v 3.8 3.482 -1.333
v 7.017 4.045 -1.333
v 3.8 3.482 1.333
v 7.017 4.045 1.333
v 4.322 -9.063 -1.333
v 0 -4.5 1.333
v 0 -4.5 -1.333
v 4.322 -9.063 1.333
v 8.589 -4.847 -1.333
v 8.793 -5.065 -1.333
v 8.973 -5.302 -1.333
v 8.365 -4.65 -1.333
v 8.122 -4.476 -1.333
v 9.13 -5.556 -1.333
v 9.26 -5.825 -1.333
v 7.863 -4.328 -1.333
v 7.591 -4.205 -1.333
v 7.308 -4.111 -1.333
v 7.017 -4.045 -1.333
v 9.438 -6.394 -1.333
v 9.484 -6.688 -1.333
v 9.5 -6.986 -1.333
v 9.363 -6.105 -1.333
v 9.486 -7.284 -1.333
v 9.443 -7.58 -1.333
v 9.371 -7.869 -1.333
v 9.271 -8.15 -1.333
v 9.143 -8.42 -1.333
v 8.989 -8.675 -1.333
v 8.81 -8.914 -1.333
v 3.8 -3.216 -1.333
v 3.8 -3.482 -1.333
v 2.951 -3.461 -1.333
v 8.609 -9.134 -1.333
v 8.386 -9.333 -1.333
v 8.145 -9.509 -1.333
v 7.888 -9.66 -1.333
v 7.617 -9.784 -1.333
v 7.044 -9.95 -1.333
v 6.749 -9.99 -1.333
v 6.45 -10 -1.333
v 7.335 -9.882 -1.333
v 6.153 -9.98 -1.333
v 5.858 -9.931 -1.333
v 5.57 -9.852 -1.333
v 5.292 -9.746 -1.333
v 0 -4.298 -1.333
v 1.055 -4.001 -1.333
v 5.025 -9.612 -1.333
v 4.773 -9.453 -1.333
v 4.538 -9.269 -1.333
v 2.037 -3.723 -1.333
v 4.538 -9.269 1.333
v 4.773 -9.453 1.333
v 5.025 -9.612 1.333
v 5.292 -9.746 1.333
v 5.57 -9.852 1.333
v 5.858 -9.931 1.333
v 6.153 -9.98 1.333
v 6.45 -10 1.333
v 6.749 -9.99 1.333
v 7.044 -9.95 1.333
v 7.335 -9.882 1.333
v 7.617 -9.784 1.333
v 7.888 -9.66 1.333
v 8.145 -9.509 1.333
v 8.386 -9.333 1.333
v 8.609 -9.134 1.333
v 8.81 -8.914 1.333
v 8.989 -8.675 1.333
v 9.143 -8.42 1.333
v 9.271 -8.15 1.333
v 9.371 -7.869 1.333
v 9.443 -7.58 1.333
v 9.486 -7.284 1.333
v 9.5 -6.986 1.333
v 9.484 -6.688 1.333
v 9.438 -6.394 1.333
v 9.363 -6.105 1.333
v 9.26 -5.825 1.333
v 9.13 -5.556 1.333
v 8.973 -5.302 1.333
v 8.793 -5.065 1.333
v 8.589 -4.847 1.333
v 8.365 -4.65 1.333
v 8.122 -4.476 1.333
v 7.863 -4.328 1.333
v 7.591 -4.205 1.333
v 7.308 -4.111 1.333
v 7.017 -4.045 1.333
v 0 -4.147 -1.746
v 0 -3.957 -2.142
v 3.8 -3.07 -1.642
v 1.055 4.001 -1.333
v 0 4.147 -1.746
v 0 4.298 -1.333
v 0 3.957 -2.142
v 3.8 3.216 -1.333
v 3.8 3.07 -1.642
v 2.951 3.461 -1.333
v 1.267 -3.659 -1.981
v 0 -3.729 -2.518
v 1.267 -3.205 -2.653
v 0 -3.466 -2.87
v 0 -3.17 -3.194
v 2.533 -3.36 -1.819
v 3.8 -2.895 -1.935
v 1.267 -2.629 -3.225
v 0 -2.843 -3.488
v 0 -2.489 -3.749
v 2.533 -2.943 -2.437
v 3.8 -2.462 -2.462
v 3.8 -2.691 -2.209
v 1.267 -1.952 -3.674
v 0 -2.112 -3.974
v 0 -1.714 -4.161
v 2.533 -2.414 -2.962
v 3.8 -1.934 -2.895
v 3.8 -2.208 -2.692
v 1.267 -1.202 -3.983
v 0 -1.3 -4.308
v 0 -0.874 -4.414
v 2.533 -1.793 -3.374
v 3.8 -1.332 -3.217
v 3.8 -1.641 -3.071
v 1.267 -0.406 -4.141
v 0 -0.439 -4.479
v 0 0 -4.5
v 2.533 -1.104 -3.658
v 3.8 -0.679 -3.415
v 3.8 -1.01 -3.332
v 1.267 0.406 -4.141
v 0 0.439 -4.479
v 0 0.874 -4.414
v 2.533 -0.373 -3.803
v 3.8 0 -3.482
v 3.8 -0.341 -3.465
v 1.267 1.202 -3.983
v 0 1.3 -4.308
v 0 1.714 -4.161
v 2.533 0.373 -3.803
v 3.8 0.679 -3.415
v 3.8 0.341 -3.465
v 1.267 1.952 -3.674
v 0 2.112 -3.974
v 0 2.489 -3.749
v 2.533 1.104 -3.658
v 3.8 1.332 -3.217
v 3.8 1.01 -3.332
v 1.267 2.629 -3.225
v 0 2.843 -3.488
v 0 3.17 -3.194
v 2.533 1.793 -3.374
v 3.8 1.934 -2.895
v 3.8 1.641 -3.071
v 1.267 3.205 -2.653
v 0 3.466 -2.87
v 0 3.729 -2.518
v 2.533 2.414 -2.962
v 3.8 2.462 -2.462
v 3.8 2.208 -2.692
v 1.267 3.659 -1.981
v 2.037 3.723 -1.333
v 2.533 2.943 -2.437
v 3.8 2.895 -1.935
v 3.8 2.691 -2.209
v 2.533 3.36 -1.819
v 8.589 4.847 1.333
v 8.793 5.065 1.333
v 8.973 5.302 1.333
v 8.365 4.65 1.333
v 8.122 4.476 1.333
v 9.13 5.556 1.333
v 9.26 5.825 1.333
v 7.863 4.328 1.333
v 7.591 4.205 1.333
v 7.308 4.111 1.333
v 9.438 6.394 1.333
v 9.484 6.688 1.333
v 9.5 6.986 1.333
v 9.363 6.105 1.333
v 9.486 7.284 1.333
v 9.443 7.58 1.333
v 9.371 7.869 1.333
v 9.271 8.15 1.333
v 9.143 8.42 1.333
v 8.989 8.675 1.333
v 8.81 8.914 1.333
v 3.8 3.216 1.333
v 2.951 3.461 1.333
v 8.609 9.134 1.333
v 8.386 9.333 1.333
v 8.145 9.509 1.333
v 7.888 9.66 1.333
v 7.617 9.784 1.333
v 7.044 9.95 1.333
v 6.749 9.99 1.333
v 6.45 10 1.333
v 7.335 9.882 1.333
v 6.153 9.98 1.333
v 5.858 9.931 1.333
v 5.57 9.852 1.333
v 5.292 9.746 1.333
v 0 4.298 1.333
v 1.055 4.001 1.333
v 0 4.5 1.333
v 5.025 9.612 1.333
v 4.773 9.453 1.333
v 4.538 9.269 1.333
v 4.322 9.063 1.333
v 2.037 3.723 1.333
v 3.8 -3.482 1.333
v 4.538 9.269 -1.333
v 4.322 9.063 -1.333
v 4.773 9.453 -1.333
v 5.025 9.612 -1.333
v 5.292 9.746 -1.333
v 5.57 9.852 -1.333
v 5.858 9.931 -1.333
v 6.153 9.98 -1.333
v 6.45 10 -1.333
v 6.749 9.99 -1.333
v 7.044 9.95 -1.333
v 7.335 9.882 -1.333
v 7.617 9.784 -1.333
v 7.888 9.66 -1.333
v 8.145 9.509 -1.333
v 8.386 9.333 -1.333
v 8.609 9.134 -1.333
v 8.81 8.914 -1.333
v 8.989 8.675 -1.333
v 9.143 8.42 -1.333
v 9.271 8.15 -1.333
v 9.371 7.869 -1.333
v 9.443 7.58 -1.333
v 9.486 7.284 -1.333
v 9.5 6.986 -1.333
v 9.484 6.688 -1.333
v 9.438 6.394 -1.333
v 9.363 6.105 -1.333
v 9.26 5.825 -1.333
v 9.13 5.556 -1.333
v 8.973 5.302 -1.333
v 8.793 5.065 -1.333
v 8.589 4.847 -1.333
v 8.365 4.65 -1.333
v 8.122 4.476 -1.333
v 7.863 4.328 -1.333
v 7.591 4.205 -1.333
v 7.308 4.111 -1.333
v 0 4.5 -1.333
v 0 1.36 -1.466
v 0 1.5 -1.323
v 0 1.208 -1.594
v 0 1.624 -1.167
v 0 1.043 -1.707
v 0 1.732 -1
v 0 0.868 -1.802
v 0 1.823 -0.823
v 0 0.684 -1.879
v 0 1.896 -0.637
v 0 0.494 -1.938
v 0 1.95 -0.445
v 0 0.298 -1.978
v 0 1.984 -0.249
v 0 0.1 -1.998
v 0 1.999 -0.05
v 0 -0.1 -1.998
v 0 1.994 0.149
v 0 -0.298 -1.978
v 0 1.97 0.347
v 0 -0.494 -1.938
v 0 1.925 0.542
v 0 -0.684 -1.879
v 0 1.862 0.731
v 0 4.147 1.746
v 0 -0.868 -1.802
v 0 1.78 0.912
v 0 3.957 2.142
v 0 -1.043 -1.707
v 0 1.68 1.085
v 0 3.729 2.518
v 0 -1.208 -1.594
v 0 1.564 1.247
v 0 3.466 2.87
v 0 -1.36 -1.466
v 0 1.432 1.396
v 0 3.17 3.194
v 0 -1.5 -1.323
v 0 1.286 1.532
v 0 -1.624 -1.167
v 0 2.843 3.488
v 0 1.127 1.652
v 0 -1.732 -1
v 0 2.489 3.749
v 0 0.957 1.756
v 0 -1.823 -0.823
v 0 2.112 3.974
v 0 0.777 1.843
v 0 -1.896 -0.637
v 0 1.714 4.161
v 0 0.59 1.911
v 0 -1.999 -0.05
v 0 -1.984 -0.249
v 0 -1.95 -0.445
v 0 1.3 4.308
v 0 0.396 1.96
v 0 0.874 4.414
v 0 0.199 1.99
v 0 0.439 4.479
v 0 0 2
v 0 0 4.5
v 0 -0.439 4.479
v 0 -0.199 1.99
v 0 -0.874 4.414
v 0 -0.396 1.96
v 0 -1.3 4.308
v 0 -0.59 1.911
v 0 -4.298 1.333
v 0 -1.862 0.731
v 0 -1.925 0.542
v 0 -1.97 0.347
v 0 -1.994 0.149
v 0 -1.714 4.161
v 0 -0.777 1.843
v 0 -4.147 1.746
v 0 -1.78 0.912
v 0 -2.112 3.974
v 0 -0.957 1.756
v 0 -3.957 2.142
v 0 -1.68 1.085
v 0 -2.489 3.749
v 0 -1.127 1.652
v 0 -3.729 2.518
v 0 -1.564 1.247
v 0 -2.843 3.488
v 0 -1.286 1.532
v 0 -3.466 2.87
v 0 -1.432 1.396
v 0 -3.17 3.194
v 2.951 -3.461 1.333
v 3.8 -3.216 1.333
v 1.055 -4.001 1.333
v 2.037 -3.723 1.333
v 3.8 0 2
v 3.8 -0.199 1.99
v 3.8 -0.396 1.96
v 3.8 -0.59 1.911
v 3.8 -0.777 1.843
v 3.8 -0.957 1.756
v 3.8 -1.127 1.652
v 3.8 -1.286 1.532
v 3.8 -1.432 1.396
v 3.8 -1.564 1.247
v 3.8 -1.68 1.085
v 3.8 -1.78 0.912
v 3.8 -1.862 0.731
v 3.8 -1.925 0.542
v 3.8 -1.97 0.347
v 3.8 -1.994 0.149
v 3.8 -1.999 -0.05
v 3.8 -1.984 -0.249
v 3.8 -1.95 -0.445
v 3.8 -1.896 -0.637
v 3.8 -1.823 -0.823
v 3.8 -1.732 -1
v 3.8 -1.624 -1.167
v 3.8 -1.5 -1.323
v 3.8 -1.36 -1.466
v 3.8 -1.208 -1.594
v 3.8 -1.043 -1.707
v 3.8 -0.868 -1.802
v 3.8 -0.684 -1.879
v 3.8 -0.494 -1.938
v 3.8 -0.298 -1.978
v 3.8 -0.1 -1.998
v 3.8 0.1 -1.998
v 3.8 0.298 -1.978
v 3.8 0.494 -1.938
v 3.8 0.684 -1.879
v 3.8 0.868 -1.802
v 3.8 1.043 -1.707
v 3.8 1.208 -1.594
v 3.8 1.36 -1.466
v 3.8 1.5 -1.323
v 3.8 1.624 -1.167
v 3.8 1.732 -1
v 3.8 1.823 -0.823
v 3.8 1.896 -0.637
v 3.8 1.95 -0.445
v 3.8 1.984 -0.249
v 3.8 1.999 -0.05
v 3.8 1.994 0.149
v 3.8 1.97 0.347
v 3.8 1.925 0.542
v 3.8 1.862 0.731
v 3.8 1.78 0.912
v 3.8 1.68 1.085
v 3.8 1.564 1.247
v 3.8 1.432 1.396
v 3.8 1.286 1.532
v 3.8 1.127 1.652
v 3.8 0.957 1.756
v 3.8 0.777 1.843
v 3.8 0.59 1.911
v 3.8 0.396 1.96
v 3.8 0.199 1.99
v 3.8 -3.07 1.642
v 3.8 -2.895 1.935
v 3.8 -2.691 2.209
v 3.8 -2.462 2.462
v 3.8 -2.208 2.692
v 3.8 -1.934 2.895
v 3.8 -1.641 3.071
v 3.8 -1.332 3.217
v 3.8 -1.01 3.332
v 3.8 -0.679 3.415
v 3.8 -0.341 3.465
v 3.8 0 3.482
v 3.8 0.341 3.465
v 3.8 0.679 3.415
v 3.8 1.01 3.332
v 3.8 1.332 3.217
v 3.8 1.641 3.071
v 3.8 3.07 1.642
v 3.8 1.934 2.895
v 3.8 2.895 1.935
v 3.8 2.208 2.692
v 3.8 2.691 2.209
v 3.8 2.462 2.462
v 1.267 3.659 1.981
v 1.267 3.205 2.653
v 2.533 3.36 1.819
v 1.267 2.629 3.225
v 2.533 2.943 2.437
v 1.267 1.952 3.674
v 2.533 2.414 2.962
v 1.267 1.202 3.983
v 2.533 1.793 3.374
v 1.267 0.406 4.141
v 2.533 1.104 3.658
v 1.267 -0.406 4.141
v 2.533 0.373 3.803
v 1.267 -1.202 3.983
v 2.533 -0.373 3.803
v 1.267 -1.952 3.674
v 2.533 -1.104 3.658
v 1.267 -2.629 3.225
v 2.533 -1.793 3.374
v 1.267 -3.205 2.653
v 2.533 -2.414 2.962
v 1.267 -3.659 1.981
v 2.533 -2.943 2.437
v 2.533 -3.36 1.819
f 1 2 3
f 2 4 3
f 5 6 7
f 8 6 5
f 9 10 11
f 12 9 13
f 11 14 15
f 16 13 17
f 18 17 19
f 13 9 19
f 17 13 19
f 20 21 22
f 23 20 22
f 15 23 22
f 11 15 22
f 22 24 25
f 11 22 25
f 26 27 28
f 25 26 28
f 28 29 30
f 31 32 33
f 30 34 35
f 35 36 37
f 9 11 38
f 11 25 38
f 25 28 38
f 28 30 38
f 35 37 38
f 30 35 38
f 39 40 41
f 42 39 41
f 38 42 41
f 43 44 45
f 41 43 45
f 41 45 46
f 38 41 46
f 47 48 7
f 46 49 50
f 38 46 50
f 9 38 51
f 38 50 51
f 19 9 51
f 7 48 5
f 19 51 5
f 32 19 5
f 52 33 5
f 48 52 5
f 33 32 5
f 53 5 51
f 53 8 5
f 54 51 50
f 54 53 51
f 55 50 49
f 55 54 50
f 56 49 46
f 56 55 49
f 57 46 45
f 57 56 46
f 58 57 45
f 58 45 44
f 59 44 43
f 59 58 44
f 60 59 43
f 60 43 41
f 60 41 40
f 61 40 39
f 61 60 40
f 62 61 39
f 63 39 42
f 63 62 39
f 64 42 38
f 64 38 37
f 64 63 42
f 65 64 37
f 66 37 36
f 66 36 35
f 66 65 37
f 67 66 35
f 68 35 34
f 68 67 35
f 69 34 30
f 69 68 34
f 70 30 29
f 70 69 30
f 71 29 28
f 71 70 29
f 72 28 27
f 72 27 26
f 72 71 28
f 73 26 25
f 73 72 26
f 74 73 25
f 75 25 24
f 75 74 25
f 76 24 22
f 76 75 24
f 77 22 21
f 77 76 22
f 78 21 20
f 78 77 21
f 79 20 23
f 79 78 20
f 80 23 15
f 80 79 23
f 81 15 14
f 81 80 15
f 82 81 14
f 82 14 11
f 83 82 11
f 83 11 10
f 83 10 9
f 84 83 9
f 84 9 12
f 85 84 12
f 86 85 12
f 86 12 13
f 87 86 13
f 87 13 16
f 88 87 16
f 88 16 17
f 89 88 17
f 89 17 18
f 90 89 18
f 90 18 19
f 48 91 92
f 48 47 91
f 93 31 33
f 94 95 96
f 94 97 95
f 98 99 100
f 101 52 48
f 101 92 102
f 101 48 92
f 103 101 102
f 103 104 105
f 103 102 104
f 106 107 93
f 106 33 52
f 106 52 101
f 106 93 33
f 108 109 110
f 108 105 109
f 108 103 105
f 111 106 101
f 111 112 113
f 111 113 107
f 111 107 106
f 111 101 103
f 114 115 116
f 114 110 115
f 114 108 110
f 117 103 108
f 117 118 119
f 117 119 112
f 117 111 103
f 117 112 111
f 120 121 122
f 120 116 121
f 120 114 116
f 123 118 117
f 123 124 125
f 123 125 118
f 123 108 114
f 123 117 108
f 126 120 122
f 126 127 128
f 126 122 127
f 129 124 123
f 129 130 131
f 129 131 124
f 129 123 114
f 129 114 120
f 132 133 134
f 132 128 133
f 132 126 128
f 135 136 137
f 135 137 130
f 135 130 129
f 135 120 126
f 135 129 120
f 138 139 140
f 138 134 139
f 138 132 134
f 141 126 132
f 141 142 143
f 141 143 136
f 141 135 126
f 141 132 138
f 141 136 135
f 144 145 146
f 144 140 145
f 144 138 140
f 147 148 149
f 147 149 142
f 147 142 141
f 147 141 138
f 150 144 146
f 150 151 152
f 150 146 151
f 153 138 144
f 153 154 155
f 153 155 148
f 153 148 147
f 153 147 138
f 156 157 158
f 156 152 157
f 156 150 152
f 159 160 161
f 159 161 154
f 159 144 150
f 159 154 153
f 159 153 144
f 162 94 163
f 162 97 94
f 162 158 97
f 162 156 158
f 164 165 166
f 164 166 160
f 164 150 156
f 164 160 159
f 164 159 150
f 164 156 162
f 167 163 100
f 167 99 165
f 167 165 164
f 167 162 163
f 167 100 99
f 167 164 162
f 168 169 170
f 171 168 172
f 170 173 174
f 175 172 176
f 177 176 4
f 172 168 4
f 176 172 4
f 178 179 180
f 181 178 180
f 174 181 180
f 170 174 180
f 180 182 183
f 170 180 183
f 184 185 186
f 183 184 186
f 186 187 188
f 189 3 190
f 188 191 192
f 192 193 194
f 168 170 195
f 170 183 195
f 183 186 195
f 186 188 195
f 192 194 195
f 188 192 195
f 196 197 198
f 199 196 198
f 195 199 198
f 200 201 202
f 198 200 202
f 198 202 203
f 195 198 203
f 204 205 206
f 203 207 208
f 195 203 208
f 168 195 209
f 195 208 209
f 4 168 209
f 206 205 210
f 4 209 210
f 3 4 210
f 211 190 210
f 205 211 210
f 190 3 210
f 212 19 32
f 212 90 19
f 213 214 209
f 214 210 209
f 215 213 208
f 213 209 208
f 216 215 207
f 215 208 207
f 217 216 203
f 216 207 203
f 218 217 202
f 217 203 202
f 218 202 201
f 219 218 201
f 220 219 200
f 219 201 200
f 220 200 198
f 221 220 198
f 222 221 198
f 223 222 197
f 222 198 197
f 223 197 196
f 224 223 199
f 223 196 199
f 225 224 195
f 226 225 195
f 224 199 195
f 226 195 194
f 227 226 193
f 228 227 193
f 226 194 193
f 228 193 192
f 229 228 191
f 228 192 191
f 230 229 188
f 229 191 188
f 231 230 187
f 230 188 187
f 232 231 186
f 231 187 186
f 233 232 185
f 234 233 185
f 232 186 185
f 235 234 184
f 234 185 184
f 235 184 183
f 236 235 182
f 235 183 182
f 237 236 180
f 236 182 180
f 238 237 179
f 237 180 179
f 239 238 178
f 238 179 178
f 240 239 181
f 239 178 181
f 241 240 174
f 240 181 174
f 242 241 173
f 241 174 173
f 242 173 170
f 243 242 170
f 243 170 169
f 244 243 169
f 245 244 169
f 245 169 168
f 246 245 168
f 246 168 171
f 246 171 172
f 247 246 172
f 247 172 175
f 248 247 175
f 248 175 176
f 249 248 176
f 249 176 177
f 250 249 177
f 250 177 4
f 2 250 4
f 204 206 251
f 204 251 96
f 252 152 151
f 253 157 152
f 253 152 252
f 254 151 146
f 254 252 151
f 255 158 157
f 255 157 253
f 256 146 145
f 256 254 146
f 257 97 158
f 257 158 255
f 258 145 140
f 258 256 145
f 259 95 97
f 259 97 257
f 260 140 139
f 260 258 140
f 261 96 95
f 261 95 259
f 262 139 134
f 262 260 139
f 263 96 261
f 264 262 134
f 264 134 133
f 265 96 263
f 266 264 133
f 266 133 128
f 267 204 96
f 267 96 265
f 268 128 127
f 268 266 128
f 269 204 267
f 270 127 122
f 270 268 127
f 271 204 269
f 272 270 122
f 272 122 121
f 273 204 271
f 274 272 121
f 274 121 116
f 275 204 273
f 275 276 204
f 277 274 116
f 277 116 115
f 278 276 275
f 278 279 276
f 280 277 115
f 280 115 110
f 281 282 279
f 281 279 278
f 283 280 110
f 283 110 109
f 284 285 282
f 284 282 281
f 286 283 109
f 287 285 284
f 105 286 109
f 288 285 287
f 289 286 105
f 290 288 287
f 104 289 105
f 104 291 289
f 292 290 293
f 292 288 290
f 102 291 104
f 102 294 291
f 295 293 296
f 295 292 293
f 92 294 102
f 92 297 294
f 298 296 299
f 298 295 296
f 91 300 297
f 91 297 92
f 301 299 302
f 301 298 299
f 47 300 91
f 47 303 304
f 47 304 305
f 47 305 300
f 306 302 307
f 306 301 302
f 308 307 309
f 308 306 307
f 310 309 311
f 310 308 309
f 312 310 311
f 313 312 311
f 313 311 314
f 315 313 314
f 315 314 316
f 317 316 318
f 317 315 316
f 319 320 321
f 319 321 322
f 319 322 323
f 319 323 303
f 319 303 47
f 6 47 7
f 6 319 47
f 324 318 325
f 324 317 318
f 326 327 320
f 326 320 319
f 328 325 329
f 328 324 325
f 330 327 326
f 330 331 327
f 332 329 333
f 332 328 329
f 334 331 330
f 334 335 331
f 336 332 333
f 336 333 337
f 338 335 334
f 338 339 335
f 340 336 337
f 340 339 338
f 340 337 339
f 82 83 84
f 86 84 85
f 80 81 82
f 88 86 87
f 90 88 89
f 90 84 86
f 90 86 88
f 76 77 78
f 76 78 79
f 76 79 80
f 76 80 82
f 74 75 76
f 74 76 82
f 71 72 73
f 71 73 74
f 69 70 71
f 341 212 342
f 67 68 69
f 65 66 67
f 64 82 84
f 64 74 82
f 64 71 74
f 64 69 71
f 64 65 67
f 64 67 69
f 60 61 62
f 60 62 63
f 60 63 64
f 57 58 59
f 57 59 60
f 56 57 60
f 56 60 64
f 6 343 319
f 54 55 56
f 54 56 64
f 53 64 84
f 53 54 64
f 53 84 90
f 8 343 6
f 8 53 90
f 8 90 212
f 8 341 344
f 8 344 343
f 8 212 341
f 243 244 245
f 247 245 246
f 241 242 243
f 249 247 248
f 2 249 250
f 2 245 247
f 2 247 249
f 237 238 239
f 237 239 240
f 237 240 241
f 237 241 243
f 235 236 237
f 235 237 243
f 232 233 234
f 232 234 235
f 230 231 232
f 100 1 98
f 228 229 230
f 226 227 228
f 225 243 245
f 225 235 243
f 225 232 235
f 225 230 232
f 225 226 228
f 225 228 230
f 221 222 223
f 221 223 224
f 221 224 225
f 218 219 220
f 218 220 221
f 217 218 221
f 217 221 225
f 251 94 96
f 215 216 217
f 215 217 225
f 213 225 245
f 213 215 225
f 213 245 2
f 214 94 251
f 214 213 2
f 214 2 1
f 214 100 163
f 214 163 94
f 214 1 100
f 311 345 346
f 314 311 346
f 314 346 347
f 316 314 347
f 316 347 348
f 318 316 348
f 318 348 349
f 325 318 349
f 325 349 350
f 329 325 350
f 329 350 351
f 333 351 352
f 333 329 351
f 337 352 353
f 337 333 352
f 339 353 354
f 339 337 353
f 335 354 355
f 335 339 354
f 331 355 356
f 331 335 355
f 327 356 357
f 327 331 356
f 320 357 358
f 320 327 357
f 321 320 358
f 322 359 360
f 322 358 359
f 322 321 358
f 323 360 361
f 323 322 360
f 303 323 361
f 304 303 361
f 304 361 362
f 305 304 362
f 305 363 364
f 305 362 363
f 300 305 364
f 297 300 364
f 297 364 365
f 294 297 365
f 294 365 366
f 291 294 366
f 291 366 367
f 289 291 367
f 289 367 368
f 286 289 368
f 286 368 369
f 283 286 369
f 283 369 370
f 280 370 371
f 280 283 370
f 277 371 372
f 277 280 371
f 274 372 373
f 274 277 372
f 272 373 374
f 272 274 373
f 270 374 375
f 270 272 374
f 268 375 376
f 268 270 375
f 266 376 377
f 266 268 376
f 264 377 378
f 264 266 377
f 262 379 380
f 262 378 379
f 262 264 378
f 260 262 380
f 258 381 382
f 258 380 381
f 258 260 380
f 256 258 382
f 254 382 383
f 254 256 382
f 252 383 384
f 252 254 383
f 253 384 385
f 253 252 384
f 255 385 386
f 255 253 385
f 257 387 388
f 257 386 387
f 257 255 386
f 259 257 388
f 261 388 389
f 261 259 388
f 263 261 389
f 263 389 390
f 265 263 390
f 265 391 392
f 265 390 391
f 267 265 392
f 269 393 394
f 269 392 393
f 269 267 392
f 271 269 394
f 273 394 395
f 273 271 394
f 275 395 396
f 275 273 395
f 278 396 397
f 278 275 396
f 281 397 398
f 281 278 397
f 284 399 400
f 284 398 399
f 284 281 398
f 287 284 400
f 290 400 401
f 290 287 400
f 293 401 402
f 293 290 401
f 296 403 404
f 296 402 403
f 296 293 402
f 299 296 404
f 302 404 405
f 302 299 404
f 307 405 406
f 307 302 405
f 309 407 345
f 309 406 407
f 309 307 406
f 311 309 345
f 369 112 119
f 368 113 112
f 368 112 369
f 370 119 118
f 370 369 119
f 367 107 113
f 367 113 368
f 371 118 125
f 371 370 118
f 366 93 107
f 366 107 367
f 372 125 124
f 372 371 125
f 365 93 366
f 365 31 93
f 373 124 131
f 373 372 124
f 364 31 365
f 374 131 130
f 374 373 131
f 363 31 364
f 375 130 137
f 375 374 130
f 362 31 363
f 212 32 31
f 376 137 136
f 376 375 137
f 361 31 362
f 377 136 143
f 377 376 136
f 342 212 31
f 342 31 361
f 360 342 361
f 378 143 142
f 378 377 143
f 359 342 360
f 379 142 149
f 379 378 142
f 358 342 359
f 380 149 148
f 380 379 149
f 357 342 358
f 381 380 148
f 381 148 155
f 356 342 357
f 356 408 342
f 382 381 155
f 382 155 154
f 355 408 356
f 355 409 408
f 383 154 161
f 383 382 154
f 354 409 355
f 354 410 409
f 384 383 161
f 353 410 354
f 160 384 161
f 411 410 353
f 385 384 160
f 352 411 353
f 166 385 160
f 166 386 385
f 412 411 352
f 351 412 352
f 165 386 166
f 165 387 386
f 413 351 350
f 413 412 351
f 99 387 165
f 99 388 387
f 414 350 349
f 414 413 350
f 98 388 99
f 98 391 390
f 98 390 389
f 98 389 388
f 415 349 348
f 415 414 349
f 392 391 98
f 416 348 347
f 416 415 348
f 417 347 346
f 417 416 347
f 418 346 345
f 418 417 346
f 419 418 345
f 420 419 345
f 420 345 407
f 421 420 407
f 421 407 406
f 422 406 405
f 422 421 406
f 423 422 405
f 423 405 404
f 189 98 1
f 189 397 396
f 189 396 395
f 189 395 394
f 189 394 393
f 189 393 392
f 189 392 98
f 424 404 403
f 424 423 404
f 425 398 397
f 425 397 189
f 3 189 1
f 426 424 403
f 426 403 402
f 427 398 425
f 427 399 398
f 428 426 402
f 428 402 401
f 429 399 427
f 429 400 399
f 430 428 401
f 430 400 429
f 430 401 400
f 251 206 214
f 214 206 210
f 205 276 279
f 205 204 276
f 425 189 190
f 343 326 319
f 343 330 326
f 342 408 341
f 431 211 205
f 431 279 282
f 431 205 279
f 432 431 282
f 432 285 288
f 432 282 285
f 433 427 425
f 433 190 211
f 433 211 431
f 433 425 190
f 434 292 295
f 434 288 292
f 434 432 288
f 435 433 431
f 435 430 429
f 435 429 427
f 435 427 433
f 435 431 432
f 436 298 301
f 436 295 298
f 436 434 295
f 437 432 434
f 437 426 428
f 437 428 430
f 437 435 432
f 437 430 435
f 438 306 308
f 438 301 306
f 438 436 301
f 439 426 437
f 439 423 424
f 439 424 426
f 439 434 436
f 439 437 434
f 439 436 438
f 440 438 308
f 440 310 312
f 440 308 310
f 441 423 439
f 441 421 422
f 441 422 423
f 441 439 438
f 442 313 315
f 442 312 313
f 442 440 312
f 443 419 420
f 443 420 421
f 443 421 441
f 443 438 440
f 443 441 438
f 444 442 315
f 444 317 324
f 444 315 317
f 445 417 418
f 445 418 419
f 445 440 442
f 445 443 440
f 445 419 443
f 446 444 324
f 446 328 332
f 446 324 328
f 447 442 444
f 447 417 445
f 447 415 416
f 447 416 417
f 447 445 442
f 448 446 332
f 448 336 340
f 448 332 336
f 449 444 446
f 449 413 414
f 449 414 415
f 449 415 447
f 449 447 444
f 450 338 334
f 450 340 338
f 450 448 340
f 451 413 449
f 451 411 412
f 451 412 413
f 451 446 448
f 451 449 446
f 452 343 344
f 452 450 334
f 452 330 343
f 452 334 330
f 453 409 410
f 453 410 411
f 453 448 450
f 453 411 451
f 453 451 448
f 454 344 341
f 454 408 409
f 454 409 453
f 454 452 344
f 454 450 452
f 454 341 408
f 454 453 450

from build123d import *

# Parameters (mm, degrees)
BOSS_EXTRUDE1_DEPTH = 1.333333333


with BuildPart() as part:
    # Sketch2 → Revolve1 (revolve)
    with BuildSketch(Plane(origin=(0, 0, 0), x_dir=(1, 0, 0), z_dir=(0, 1, 0)), mode=Mode.PRIVATE) as revolve1_sk:
        Polygon((0, 2), (0, 4.5), (3.8, 3.481793069), (3.8, 2), align=None)
    revolve(revolve1_sk.sketch.rotate(Axis((0, 0, 0), (1, 0, 0)), 180), axis=Axis((0, 0, 0), (1, 0, 0)))

    # Sketch3 → Boss-Extrude1 (add, symmetric)
    with BuildSketch(Plane.XY):
        with BuildLine():
            Line((0, 4.5), (4.321922287, 9.063002054))
            ThreePointArc((4.321922287, 9.063002054), (9.142888967, 8.419555533), (7.017244249, 4.04492667))
            Line((7.017244249, 4.04492667), (3.8, 3.481793069))
            Line((3.8, 3.481793069), (3.8, 2))
            Line((3.8, 2), (0, 2))
            Line((0, 2), (0, 4.5))
        make_face()
    boss_extrude1 = extrude(amount=BOSS_EXTRUDE1_DEPTH, both=True)

    # Mirror1: Boss-Extrude1 across plane
    add(boss_extrude1.mirror(Plane.ZX))


solid = part.part
